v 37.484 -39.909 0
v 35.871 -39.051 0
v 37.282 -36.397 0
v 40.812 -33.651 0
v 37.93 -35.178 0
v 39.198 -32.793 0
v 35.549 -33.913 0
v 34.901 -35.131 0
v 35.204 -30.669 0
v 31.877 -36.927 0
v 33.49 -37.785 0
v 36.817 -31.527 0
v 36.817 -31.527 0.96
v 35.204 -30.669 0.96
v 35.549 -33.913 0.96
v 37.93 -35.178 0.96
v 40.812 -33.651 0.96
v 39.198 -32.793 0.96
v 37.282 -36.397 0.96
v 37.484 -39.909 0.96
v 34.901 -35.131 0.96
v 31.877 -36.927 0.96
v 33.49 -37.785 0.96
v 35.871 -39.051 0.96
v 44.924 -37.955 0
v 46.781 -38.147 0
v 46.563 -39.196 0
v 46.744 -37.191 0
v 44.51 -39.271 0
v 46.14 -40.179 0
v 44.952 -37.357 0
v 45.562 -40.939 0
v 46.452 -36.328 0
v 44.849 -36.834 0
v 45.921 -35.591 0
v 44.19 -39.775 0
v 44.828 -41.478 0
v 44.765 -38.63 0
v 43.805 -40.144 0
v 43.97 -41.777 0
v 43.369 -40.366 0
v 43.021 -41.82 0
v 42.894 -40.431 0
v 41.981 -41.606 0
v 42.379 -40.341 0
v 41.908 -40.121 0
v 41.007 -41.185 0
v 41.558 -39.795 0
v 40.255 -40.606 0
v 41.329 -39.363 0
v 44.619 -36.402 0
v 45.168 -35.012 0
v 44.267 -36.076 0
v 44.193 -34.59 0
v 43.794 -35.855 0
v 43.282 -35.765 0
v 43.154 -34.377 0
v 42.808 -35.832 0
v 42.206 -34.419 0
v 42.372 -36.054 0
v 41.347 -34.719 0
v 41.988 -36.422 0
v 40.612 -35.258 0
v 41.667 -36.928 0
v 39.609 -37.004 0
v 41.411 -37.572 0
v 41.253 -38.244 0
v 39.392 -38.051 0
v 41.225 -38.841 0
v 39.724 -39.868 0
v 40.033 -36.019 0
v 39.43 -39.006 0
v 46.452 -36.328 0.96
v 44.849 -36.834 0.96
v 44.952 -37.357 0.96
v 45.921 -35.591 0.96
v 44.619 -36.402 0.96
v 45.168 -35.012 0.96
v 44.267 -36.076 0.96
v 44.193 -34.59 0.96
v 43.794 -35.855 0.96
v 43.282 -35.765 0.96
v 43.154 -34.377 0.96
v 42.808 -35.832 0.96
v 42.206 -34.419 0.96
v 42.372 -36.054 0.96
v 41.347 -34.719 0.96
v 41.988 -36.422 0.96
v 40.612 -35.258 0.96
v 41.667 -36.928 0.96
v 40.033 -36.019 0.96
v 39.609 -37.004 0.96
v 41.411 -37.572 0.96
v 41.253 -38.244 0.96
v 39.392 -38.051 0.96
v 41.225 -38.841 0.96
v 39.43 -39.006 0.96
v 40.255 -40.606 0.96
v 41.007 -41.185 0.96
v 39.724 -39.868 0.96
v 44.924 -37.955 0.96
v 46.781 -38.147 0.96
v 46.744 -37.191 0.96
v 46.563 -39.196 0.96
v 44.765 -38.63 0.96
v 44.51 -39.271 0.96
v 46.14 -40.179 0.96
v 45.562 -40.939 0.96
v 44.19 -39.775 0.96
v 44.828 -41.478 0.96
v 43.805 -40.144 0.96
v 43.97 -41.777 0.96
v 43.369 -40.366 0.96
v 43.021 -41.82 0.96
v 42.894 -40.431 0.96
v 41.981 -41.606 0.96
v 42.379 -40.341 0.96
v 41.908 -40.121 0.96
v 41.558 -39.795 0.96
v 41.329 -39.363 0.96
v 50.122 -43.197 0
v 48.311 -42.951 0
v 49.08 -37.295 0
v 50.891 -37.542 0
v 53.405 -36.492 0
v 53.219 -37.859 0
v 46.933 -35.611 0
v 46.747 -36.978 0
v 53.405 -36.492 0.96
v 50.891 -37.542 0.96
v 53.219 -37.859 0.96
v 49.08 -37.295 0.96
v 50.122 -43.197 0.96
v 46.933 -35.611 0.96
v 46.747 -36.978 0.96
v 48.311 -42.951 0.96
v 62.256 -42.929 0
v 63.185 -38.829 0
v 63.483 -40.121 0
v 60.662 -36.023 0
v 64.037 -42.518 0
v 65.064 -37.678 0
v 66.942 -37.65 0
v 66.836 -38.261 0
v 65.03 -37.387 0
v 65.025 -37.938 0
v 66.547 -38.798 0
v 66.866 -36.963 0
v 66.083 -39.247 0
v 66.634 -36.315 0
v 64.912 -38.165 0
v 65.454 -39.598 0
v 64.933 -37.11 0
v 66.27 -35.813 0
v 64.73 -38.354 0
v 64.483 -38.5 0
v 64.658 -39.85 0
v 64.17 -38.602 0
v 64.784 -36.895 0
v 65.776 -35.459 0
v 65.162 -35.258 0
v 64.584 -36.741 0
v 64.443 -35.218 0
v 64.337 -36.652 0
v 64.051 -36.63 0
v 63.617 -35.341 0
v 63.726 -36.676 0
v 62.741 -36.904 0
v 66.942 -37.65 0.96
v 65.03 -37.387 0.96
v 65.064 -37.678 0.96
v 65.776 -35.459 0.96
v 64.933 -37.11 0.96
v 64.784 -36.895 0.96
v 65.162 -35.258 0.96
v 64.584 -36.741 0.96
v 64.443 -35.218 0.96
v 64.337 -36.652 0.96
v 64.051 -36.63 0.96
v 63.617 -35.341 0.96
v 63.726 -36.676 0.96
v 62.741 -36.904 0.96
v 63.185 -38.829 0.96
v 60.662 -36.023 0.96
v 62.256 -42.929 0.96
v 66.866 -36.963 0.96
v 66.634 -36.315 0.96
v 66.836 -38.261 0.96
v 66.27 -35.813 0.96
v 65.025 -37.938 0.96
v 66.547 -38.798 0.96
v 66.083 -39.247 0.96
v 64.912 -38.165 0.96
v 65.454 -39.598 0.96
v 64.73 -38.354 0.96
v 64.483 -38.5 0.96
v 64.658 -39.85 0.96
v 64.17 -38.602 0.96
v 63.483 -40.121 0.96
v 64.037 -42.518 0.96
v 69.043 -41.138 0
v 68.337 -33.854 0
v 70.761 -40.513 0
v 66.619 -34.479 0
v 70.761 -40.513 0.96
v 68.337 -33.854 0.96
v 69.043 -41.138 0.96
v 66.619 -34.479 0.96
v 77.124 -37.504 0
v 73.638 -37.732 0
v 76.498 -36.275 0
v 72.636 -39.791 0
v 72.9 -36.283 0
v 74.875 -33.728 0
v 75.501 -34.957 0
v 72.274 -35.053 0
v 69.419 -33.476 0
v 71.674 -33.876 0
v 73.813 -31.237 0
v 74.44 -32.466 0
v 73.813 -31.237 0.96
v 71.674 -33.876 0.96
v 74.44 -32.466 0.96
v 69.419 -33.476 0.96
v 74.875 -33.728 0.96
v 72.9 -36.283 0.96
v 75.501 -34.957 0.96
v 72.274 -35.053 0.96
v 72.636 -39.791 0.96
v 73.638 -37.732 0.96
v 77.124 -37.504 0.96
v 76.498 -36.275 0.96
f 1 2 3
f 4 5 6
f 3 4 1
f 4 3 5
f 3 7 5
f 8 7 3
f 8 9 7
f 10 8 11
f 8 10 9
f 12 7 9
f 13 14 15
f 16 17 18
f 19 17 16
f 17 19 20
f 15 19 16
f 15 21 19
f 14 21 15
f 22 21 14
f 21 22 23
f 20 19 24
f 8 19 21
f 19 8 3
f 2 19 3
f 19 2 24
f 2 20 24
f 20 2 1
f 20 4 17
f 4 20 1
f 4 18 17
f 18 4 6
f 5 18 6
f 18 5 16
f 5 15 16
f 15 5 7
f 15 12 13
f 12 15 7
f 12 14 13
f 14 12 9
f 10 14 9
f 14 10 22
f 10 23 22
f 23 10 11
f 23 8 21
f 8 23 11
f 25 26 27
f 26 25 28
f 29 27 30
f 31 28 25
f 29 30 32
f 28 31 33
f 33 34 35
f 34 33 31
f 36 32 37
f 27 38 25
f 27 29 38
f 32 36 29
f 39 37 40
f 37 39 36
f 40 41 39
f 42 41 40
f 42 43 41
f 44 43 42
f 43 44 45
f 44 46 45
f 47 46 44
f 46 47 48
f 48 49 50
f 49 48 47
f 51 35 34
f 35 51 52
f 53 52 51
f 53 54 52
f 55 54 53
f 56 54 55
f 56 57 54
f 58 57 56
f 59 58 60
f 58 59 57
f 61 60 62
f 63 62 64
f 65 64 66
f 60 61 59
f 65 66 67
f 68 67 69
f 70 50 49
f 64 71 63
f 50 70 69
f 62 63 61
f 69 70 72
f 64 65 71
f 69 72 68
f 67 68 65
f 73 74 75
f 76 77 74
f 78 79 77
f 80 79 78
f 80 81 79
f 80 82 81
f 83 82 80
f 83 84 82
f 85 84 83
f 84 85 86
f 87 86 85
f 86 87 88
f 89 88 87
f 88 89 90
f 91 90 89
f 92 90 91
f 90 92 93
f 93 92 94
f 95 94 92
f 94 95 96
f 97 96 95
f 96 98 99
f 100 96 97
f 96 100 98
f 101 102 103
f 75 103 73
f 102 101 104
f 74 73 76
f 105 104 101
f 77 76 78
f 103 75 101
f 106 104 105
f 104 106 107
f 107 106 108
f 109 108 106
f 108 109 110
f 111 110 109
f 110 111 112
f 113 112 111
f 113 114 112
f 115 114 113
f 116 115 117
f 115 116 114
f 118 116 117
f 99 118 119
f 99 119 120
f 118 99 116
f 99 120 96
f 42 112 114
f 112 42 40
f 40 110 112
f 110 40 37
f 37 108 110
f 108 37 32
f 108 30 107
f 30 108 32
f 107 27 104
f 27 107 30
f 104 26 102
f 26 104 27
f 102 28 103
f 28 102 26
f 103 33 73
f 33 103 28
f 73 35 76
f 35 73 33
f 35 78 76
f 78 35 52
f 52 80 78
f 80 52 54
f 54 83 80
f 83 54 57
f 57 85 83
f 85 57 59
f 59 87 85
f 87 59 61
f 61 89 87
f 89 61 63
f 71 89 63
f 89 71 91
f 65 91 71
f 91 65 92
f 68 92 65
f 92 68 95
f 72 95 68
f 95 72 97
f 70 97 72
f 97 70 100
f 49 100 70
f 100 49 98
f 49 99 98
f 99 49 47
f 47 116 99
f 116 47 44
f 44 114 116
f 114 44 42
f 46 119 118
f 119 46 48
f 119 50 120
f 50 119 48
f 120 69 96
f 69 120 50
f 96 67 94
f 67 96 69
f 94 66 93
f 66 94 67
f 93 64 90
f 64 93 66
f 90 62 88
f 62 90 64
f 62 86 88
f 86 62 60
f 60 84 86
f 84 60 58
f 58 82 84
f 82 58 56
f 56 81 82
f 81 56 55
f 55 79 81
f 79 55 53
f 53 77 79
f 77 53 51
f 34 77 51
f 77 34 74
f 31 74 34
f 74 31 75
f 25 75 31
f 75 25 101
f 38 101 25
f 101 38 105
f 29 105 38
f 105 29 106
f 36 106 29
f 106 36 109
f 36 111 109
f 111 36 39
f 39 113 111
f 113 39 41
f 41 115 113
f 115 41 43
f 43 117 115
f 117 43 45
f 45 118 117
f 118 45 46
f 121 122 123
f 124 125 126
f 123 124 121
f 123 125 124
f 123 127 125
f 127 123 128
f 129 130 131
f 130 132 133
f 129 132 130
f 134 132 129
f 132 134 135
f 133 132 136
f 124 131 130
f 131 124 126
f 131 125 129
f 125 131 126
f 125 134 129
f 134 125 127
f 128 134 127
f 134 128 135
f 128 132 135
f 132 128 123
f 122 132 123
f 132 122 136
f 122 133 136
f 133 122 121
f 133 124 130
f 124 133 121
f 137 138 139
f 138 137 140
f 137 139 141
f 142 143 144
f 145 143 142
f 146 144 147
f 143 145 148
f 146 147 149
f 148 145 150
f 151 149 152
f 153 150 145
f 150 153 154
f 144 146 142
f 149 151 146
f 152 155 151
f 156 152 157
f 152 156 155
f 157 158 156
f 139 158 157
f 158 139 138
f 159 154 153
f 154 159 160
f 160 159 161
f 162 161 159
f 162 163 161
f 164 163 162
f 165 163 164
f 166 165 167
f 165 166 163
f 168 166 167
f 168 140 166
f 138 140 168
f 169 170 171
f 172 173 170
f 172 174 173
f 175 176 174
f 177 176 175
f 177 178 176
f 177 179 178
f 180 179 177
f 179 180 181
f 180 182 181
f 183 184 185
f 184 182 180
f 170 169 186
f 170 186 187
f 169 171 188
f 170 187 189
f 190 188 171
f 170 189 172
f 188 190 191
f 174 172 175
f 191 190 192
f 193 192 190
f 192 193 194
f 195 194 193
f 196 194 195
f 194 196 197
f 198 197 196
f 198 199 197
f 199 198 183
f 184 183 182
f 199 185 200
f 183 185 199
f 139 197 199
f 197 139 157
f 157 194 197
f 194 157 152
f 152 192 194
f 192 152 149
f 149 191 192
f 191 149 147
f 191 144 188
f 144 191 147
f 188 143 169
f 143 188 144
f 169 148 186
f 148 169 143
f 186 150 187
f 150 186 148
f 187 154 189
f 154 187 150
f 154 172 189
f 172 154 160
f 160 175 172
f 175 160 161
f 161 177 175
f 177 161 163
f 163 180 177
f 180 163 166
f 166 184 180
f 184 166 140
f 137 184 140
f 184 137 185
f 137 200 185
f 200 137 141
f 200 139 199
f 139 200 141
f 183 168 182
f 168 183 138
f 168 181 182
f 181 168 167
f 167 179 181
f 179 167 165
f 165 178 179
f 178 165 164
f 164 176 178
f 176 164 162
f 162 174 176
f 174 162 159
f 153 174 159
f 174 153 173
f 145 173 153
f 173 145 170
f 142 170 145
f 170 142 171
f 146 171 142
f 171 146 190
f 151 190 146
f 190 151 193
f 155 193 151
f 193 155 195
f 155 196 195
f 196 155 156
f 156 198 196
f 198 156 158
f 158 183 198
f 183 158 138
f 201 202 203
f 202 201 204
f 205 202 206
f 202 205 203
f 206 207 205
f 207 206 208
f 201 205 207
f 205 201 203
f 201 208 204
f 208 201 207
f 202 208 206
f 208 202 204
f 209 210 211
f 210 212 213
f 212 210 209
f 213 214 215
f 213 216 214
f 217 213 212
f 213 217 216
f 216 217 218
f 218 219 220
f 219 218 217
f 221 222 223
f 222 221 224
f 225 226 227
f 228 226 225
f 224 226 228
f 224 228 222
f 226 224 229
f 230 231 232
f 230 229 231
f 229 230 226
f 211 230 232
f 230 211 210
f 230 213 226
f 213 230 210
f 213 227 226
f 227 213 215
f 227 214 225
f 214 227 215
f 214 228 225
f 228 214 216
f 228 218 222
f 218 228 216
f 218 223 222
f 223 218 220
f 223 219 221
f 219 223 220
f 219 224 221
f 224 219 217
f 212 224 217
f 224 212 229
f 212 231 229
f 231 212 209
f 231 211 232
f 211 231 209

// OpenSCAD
// file: ../Parts/rounder.scad
// rounder.scad
// cutting tool for rounding off corners with a cylinder

//---------------------
module rounder(
r=10,   // radius
h=10,   // height
f=22,    // $fn
extra=0.01  // extra size for the cube
){

difference(){
  translate([-extra,-extra,-extra])
  cube([r+extra,r+extra,h+2*extra]);
  translate([r,r,-1])
  cylinder(r=r,h=h+2,$fn=f);
}

}

//---------------------------------------------------------------------------
module bevel(x=1,y=1,h=10){

linear_extrude(height=h)
polygon(points=[[0,0],[x,0],[0,y]]);
    
}
  

//========================

rounder();

//========================
// main file
//======================================================================
// HotPie.scad
//
// Hot Pie Earrings for Rosalee's
//
// DrTomFlint 25 Nov 2025
//
//======================================================================

use <../Parts/rounder.scad>

layer = 0.24;
thick = 4*layer;
line = 0.8;

F1 = 99;
F2 = 24;  

//~ a1 = -30;
//~ a2 = -18;
//~ a3 = -7;
//~ a4 = 12;
//~ a5 = 20;
//~ a6 = 28;

//~ apie=56;

//~ yoff= -30;
//~ tsize = 5.4;
//~ poff = 3.0;


a1 = -28;
a2 = -17.5;
a3 = -7.75;
a4 = 13;
a5 = 20;
a6 = 27;

apie=56;

yoff= -40;
tsize = 7;
poff = 5;

//----------------------------------------------------------------------
module hotpie(){

    rotate([0,0,a1])
    translate([0,yoff,0])
    linear_extrude(height=thick)
    text("H", font = "Open Sans:style=Bold", size=tsize,halign="center",valign="center",spacing=1.0);

    rotate([0,0,a2])
    translate([0,yoff,0])
    linear_extrude(height=thick)
    text("O", font = "Open Sans:style=Bold", size=tsize,halign="center",valign="center",spacing=1.0);

    rotate([0,0,a3])
    translate([0,yoff,0])
    linear_extrude(height=thick)
    text("T", font = "Open Sans:style=Bold", size=tsize,halign="center",valign="center",spacing=1.0);

    rotate([0,0,a4])
    translate([0,yoff,0])
    linear_extrude(height=thick)
    text("P", font = "Open Sans:style=Bold", size=tsize,halign="center",valign="center",spacing=1.0);

    rotate([0,0,a5])
    translate([0,yoff,0])
    linear_extrude(height=thick)
    text("I", font = "Open Sans:style=Bold", size=tsize,halign="center",valign="center",spacing=1.0);

    rotate([0,0,a6])
    translate([0,yoff,0])
    linear_extrude(height=thick)
    text("E", font = "Open Sans:style=Bold", size=tsize,halign="center",valign="center",spacing=1.0);


}

//----------------------------------------------------------------------
module hotpieBlack(){

m1=0.9;

    rotate([0,0,a1])
    translate([0,yoff,0])
    difference(){
      minkowski(){
        linear_extrude(height=thick)
        text("H", font = "Open Sans:style=Bold", size=tsize,halign="center",valign="center",spacing=1.0);
        
        cylinder(r=m1,h=0.001,$fn=12,center=true);
      }
      
      translate([0,0,-1])
      linear_extrude(height=thick+2)
      text("H", font = "Open Sans:style=Bold", size=tsize,halign="center",valign="center",spacing=1.0);
    }

    rotate([0,0,a2])
    translate([0,yoff,0])
    difference(){
      minkowski(){
        linear_extrude(height=thick)
        text("O", font = "Open Sans:style=Bold", size=tsize,halign="center",valign="center",spacing=1.0);
        
        cylinder(r=m1,h=0.001,$fn=12,center=true);
      }
      
      translate([0,0,-1])
      linear_extrude(height=thick+2)
      text("O", font = "Open Sans:style=Bold", size=tsize,halign="center",valign="center",spacing=1.0);
    }

    rotate([0,0,a3])
    translate([0,yoff,0])
    difference(){
      minkowski(){
        linear_extrude(height=thick)
        text("T", font = "Open Sans:style=Bold", size=tsize,halign="center",valign="center",spacing=1.0);
        
        cylinder(r=m1,h=0.001,$fn=12,center=true);
      }
      
      translate([0,0,-1])
      linear_extrude(height=thick+2)
      text("T", font = "Open Sans:style=Bold", size=tsize,halign="center",valign="center",spacing=1.0);
    }

    rotate([0,0,a4])
    translate([0,yoff,0])
    difference(){
      minkowski(){
        linear_extrude(height=thick)
        text("P", font = "Open Sans:style=Bold", size=tsize,halign="center",valign="center",spacing=1.0);
        
        cylinder(r=m1,h=0.001,$fn=12,center=true);
      }
      
      translate([0,0,-1])
      linear_extrude(height=thick+2)
      text("P", font = "Open Sans:style=Bold", size=tsize,halign="center",valign="center",spacing=1.0);
    }

    rotate([0,0,a5])
    translate([0,yoff,0])
    difference(){
      minkowski(){
        linear_extrude(height=thick)
        text("I", font = "Open Sans:style=Bold", size=tsize,halign="center",valign="center",spacing=1.0);
        
        cylinder(r=m1,h=0.001,$fn=12,center=true);
      }
      
      translate([0,0,-1])
      linear_extrude(height=thick+2)
      text("I", font = "Open Sans:style=Bold", size=tsize,halign="center",valign="center",spacing=1.0);
    }

    rotate([0,0,a6])
    translate([0,yoff,0])
    difference(){
      minkowski(){
        linear_extrude(height=thick)
        text("E", font = "Open Sans:style=Bold", size=tsize,halign="center",valign="center",spacing=1.0);
        
        cylinder(r=m1,h=0.001,$fn=12,center=true);
      }
      
      translate([0,0,-1])
      linear_extrude(height=thick+2)
      text("E", font = "Open Sans:style=Bold", size=tsize,halign="center",valign="center",spacing=1.0);
    }




}

//----------------------------------------------------------------------
module pieFull(){

  difference(){
    cylinder(r=-yoff-poff,h=thick,$fn=F1);
    rotate([0,0,apie])
    translate([-100,0,-thick])
    cube([200,200,3*thick]);
    rotate([0,0,-apie])
    translate([-100,0,-thick])
    cube([200,200,3*thick]);
  }

}

//----------------------------------------------------------------------
module pie(){

  difference(){
    pieFull();
    translate([0,0,-1])
    scale([1,1,3]){
      roundsFull();
      squares();
    }
  }

}

//----------------------------------------------------------------------
module pie2(){

  difference(){
    pieFull();
    translate([0,0,-1])
    scale([1,1,3]){
      roundsFull2();
      squaresFull2();
    }
  }

}

//----------------------------------------------------------------------
module rounds(){

  difference(){
    union(){
      translate([2,-5,0])
      cylinder(r=4,h=thick,$fn=F2);
      
      translate([-8.2,-18,0])
      cylinder(r=4,h=thick,$fn=F2);
      
      translate([13,-25,0])
      cylinder(r=4,h=thick,$fn=F2);
    }
    rotate([0,0,apie])
    translate([-100,0,-thick])
    cube([200,200,3*thick]);
    rotate([0,0,-apie])
    translate([-100,0,-thick])
    cube([200,200,3*thick]);
  }

}

//----------------------------------------------------------------------
module rounds2(){

  difference(){
    union(){
      translate([-3,-9,0])
      cylinder(r=4,h=thick,$fn=F2);
      
      translate([4,-27,0])
      cylinder(r=4,h=thick,$fn=F2);
      
      translate([-13,-25,0])
      cylinder(r=4,h=thick,$fn=F2);
    }
    rotate([0,0,apie])
    translate([-100,0,-thick])
    cube([200,200,3*thick]);
    rotate([0,0,-apie])
    translate([-100,0,-thick])
    cube([200,200,3*thick]);
  }

}
//----------------------------------------------------------------------
module roundsFull2(){

    union(){
      translate([-3,-9,0])
      cylinder(r=4,h=thick,$fn=F2);
      
      translate([4,-27,0])
      cylinder(r=4,h=thick,$fn=F2);
      
      translate([-13,-25,0])
      cylinder(r=4,h=thick,$fn=F2);
    }

}

//----------------------------------------------------------------------
module roundsFull(){

    union(){
      translate([2,-5,0])
      cylinder(r=4,h=thick,$fn=F2);
      
      translate([-8.2,-18,0])
      cylinder(r=4,h=thick,$fn=F2);
      
      translate([13,-25,0])
      cylinder(r=4,h=thick,$fn=F2);
    }

}


//----------------------------------------------------------------------
module squares(){

  difference(){
    union(){
      translate([3,-15,0])
      rotate([0,0,30])
      cube([5,2,thick]);
      
      translate([-1,-22,0])
      rotate([0,0,-45])
      cube([7,2,thick]);
      
      translate([-11,-29,0])
      rotate([0,0,15])
      cube([6,2,thick]);
    }
    rotate([0,0,apie])
    translate([-100,0,-thick])
    cube([200,200,3*thick]);
    rotate([0,0,-apie])
    translate([-100,0,-thick])
    cube([200,200,3*thick]);
  }

}
//----------------------------------------------------------------------
module squares2(){

  difference(){
    union(){
      translate([8,-17,0])
      rotate([0,0,-30])
      cube([5,2,thick]);
      
      translate([-1,-21,0])
      rotate([0,0,45])
      cube([7,2,thick]);
      
      translate([-8,-29,0])
      rotate([0,0,-40])
      cube([6,2,thick]);

      translate([14,-29,0])
      rotate([0,0,40])
      cube([6,2,thick]);
    }
    rotate([0,0,apie])
    translate([-100,0,-thick])
    cube([200,200,3*thick]);
    rotate([0,0,-apie])
    translate([-100,0,-thick])
    cube([200,200,3*thick]);
  }

}


//----------------------------------------------------------------------
module squaresFull2(){

    union(){
      translate([8,-17,0])
      rotate([0,0,-30])
      cube([5,2,thick]);
      
      translate([-1,-21,0])
      rotate([0,0,45])
      cube([7,2,thick]);
      
      translate([-8,-29,0])
      rotate([0,0,-40])
      cube([6,2,thick]);

      translate([14,-29,0])
      rotate([0,0,40])
      cube([6,2,thick]);
    }
}



//----------------------------------------------------------------------
module crust(){

m1=1.25;  

  difference(){
    minkowski(){
      pieFull();  
      cylinder(r=m1,h=0.001,$fn=12,center=true);
    }
    translate([0,0,-1])
    scale([1,1,3])
    pieFull();  
  }

}

//----------------------------------------------------------------------
module loop(){

  translate([0,2.2,0])
  scale([1.2,1.1,1])
  difference(){
    cylinder(r=2,h=thick,$fn=F1);
    cylinder(r=1,h=5*thick,center=true,$fn=F1);
  }

  translate([0,-38,0])
  scale([1.2,1.1,1])
  difference(){
    cylinder(r=2,h=thick,$fn=F1);
    cylinder(r=1,h=5*thick,center=true,$fn=F1);
  }
}

//----------------------------------------------------------------------
module pieBlack(){

  intersection(){
    union(){
      hotpieBlack();
      crust();
      loop();
    }
    translate([-100,-100,0])
    cube([200,200,layer]);
  }  

}
//----------------------------------------------------------------------
module pieClear(){

  intersection(){
    union(){
      hotpieBlack();
      crust();
      loop();
    }
    translate([-100,-100,layer])
    cube([200,200,3*layer]);
  }  

}

//====================================================================================================

//~ hotpie();

//~ hotpieBlack();

//~ pie();

//~ crust();
//~ loop();

//~ pieBlack();
//~ pieClear();

//~ rounds();
//~ squares();

// second version
xoff=55;

translate([xoff,0,0])
hotpie();

//~ translate([xoff,0,0])
//~ rounds2();

//~ translate([xoff,0,0])
//~ squares2();

//~ translate([xoff,0,0])
//~ pie2();

//~ translate([xoff,0,0])
//~ pieBlack();

//~ translate([xoff,0,0])
//~ pieClear();

//====================================================================================================
